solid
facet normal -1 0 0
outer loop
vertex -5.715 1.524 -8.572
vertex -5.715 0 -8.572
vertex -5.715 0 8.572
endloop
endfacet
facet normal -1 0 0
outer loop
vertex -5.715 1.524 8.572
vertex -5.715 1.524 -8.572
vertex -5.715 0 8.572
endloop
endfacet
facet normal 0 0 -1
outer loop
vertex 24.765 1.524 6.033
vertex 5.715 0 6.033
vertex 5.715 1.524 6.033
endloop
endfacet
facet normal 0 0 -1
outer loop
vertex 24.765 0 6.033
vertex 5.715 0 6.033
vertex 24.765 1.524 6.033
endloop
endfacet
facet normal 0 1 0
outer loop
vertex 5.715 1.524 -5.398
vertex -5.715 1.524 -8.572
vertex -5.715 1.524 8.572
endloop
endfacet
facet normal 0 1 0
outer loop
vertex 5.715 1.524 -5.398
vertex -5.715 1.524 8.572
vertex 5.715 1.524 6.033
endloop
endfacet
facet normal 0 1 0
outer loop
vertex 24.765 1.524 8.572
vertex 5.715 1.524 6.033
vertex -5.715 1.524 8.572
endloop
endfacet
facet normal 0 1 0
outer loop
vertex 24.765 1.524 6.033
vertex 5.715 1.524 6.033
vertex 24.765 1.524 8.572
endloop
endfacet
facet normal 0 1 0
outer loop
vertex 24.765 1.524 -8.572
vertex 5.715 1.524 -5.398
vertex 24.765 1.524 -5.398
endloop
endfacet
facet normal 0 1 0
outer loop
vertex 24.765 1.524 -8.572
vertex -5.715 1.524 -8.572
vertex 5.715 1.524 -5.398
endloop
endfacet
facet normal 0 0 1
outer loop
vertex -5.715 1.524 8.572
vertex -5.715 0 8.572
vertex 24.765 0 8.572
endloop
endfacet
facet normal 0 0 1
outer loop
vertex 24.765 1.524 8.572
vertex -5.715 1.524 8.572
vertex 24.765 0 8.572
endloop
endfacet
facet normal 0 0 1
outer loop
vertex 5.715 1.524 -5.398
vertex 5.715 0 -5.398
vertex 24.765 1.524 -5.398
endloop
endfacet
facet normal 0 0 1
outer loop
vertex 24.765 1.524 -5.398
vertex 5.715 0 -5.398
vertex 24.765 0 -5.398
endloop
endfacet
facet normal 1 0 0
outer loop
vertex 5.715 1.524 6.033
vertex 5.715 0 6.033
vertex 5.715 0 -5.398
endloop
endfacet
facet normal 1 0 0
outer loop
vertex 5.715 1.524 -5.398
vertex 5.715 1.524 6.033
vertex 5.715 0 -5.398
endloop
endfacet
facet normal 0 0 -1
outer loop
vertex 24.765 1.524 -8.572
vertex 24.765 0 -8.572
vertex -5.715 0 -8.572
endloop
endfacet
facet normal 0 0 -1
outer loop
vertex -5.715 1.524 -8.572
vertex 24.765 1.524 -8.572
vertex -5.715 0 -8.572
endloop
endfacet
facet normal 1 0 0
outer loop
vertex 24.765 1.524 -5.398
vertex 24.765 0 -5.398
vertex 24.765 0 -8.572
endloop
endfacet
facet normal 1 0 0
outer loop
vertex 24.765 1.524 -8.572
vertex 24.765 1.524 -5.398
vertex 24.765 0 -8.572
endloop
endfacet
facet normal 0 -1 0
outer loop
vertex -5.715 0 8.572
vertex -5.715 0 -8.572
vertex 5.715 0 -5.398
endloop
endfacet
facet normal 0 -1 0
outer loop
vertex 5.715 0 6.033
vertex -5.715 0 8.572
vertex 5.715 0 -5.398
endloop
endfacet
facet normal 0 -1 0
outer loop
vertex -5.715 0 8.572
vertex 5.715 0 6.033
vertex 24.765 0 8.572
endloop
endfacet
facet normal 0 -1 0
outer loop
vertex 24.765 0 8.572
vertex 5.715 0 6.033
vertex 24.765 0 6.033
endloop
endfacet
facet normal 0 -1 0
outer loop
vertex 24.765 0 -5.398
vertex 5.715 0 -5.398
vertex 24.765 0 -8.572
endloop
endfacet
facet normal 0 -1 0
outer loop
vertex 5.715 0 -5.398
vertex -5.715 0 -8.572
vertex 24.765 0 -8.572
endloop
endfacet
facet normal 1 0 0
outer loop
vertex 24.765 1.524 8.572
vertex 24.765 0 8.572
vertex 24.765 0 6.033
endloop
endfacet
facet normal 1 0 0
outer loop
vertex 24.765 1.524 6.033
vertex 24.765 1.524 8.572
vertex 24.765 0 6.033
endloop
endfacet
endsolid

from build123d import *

# Parameters (mm, degrees)
SKETCH1_W           = 19.05
SKETCH1_H           = 2.54
SKETCH1_H_2         = 3.175
BOSS_EXTRUDE1_DEPTH = 1.524


with BuildPart() as part:
    # Sketch1 → Boss-Extrude1 (new body)
    with BuildSketch(Plane(origin=(0, 0, 0), x_dir=(1, 0, 0), z_dir=(0, 1, 0))):
        with Locations((15.24, -7.3025)):
            Rectangle(SKETCH1_W, SKETCH1_H)
        Polygon((5.715, -6.0325), (5.715, 5.3975), (5.715, 8.5725), (-5.715, 8.5725), (-5.715, -8.5725), (5.715, -8.5725), align=None)
        with Locations((15.24, 6.985)):
            Rectangle(SKETCH1_W, SKETCH1_H_2)
    extrude(amount=BOSS_EXTRUDE1_DEPTH)


solid = part.part
